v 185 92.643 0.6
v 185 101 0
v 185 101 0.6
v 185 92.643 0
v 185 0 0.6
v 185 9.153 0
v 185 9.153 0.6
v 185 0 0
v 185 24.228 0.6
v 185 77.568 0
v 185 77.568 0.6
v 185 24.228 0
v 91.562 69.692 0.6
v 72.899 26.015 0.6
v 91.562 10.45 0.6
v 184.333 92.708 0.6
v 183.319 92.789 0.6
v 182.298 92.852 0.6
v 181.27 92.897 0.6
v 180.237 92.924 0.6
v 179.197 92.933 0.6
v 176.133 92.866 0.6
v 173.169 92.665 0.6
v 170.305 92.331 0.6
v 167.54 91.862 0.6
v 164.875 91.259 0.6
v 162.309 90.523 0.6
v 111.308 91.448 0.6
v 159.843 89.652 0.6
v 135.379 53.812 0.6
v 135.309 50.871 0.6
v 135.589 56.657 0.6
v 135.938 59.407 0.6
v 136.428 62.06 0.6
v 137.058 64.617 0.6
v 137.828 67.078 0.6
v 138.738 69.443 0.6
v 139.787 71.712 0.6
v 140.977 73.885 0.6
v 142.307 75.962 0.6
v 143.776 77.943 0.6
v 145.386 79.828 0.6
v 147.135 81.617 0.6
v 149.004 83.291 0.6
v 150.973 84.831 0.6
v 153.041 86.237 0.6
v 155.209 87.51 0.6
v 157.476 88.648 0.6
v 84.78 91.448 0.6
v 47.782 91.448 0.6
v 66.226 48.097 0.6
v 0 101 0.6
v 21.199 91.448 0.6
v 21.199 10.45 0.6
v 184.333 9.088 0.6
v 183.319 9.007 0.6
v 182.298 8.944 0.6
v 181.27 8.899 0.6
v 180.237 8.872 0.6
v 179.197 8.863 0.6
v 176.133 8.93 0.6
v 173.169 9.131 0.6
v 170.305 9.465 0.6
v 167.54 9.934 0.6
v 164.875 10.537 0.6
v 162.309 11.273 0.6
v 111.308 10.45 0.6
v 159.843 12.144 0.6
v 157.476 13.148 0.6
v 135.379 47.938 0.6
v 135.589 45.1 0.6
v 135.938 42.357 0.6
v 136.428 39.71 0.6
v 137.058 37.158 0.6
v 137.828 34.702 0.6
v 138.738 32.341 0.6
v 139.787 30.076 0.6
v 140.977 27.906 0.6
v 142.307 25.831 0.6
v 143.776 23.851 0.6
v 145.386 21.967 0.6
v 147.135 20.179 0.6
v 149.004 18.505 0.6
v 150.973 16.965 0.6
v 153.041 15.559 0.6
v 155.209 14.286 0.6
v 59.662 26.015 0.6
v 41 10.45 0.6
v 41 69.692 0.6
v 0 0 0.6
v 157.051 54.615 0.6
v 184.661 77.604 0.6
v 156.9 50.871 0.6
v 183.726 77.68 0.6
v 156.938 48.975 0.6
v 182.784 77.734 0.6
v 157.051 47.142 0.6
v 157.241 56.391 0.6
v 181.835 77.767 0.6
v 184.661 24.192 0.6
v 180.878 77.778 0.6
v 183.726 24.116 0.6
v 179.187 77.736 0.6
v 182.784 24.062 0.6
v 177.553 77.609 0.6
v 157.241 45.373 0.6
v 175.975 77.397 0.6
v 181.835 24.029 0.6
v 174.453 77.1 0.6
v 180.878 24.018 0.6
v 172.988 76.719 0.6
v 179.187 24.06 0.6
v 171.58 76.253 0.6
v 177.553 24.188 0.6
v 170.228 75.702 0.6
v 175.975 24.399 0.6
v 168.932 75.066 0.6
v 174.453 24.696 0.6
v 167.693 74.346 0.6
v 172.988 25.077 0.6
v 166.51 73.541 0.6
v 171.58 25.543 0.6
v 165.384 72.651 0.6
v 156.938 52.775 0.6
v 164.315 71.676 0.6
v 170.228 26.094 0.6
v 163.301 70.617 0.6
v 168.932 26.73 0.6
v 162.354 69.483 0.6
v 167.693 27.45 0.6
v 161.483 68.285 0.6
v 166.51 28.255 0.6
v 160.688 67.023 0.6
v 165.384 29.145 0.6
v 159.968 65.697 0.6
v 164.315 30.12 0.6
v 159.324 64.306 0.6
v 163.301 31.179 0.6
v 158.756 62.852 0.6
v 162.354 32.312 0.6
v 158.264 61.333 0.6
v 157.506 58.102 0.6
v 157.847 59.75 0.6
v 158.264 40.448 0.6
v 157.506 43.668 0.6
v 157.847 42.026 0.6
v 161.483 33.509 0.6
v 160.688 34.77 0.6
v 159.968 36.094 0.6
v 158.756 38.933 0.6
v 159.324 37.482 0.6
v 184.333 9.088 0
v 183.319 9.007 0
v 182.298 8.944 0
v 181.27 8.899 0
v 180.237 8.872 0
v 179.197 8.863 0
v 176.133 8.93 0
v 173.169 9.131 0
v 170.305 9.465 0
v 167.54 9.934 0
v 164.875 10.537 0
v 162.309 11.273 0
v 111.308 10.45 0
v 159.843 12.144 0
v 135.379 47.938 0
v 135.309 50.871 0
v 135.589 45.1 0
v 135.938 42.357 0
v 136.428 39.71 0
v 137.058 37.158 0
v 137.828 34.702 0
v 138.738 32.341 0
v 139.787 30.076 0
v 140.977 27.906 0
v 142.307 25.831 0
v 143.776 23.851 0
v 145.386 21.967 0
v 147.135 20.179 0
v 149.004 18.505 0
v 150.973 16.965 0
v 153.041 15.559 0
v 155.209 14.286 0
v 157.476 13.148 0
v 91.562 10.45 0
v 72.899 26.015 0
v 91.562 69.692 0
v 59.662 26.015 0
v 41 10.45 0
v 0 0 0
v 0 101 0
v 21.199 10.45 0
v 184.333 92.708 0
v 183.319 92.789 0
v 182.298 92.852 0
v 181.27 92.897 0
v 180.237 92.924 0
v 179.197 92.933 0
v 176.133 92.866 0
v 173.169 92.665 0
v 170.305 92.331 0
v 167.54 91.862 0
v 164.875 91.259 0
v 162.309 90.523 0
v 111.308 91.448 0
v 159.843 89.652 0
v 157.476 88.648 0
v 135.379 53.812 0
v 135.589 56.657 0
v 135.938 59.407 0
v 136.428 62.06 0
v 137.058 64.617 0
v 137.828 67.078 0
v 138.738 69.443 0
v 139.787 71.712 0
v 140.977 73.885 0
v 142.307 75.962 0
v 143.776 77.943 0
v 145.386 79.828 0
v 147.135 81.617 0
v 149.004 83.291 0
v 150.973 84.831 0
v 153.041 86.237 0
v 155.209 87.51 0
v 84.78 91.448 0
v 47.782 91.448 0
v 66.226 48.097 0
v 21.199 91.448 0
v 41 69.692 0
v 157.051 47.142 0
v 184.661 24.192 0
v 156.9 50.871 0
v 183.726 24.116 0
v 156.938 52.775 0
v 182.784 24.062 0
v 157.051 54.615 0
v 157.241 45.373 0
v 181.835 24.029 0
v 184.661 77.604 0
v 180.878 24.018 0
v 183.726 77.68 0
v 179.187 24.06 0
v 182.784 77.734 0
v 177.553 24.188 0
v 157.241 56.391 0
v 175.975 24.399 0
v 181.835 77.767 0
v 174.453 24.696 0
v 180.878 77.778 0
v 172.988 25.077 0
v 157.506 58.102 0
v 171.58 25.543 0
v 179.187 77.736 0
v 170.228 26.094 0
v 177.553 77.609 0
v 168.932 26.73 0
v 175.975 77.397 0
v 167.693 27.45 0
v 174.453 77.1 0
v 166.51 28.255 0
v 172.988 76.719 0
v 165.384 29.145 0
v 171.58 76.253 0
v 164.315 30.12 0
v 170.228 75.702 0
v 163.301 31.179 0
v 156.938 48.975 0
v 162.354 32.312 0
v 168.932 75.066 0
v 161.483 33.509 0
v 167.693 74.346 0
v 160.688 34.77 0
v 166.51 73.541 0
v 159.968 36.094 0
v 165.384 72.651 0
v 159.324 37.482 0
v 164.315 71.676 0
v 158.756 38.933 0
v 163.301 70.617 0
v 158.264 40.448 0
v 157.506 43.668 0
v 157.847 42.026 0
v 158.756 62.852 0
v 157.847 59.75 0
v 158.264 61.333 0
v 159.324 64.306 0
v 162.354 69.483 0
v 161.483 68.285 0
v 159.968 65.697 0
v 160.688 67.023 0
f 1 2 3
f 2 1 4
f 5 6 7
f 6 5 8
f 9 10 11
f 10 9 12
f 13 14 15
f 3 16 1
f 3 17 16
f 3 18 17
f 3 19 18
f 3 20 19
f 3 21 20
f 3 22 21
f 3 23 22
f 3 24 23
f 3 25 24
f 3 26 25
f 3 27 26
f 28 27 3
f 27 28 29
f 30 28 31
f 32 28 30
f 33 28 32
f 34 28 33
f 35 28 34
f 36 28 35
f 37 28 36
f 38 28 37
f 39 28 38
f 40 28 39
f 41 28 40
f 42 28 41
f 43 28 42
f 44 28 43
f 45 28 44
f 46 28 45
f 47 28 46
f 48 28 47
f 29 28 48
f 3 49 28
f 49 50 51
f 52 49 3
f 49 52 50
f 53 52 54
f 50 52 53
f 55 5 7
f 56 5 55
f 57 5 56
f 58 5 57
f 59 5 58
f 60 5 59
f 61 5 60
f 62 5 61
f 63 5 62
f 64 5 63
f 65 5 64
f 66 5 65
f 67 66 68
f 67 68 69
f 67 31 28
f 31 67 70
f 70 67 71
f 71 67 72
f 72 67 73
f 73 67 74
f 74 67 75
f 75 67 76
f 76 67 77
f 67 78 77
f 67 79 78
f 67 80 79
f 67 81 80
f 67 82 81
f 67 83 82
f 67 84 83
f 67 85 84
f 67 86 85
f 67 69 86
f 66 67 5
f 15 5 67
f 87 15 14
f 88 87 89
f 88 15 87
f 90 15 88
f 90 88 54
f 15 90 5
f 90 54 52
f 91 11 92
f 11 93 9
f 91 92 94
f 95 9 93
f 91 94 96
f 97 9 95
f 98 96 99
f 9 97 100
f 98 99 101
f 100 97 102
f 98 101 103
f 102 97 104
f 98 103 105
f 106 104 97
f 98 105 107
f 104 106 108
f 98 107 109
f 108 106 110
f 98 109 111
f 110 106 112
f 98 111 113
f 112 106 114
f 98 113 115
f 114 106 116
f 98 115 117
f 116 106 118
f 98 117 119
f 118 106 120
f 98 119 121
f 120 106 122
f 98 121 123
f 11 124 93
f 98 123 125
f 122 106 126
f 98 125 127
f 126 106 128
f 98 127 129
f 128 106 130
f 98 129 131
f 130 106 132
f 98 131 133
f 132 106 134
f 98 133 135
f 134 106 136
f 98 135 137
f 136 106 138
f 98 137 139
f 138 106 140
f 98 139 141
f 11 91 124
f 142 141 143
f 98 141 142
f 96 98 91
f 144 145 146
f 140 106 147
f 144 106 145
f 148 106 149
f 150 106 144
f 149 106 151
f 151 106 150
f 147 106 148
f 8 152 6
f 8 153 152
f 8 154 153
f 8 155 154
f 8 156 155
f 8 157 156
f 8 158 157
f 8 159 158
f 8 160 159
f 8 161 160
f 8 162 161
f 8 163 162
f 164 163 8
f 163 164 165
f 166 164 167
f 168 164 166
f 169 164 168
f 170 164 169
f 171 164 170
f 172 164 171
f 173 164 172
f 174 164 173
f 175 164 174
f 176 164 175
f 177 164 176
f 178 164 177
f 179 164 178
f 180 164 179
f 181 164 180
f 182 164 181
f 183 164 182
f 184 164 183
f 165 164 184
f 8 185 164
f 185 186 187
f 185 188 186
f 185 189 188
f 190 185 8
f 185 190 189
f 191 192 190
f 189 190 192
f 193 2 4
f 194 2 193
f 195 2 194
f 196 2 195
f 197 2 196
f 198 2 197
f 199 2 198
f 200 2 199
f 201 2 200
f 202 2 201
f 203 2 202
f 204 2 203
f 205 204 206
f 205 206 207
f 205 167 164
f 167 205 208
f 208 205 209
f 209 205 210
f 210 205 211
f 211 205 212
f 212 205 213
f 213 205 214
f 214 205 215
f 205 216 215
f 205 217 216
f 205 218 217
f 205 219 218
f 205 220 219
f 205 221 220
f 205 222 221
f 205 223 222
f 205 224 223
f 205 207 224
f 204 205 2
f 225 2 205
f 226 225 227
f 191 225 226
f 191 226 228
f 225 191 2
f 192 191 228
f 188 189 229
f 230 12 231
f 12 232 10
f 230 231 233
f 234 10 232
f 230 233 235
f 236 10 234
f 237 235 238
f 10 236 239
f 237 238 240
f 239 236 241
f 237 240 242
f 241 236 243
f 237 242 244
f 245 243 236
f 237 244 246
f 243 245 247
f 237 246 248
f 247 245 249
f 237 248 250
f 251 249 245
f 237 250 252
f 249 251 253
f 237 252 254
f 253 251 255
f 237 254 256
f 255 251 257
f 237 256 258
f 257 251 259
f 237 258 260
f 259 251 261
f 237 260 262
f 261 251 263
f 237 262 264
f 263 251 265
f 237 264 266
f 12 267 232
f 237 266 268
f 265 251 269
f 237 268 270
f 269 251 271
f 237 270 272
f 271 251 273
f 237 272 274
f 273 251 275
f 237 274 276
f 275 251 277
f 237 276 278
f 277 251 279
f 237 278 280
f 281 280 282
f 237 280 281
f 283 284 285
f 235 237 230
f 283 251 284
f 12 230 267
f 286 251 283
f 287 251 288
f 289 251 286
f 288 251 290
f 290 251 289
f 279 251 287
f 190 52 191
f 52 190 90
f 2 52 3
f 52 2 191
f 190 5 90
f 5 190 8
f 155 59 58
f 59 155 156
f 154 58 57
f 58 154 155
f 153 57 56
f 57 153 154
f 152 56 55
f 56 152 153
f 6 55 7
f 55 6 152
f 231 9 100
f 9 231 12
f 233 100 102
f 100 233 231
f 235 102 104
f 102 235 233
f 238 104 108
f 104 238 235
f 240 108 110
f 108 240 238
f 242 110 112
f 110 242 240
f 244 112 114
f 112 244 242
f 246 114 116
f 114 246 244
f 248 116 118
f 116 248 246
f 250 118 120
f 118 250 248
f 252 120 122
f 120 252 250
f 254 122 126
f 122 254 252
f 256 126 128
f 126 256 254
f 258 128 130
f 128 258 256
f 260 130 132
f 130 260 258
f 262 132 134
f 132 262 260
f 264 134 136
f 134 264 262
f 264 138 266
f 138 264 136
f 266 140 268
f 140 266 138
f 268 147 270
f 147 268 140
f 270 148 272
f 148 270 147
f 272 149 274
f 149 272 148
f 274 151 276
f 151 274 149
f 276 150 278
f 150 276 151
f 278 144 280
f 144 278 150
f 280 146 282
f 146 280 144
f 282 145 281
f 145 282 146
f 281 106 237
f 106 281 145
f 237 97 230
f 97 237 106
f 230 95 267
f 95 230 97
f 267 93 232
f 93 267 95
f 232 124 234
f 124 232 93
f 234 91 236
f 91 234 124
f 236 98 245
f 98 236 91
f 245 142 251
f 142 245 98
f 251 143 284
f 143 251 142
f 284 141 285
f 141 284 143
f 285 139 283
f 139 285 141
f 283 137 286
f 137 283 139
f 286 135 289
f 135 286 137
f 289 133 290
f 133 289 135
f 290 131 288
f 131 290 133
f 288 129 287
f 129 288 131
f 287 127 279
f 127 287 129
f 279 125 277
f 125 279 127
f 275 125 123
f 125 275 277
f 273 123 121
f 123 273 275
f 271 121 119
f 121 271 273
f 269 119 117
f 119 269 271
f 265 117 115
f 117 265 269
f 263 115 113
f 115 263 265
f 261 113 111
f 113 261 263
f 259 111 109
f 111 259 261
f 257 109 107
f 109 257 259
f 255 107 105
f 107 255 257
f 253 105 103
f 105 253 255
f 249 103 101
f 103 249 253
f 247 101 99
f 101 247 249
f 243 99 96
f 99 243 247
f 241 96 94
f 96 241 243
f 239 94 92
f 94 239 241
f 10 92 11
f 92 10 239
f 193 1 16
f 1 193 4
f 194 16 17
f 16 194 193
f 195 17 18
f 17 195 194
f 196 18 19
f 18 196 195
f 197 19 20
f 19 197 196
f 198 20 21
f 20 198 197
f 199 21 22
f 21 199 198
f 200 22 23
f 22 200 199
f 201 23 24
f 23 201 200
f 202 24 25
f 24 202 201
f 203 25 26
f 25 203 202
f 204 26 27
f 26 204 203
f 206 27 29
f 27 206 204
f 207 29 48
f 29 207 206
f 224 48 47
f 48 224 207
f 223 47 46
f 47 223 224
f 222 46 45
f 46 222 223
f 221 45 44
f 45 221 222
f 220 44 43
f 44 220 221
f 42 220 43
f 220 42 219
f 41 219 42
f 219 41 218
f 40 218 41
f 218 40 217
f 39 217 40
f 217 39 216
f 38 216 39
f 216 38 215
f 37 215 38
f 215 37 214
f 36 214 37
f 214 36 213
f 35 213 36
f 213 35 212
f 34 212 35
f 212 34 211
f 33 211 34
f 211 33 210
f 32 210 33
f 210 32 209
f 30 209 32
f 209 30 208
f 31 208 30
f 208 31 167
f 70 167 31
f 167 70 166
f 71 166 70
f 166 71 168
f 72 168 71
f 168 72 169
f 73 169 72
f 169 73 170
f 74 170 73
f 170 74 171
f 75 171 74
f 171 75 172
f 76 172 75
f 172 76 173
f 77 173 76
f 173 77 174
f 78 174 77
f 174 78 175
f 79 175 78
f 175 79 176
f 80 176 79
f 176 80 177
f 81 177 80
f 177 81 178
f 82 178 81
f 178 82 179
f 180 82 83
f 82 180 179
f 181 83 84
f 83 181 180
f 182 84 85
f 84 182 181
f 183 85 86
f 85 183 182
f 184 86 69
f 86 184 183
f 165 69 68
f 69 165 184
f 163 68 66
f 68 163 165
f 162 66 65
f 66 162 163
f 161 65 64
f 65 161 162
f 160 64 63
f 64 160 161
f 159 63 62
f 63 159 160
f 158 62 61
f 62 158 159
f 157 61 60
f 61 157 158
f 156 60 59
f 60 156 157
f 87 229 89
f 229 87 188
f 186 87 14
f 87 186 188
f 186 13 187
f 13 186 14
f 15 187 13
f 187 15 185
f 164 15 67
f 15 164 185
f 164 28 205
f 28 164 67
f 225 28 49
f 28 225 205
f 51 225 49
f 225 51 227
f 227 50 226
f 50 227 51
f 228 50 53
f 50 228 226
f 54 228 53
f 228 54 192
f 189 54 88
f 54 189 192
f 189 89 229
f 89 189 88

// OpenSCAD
// Customizable Stencils v 1.1
// http://www.thingiverse.com/thing:1488794
// Hacked by
// by infinigrove Squirrel Master 2016 (http://www.thingiverse.com/infinigrove)
//
// v1.0 Initial release
// v1.1 Fix issue with customizer and numbers
//      Moved Stencil friendly fonts to the top for customizer

Stencil_Text = "MC";

Stencil_Font="Stardos Stencil"; //[Allerta Stencil,Black Ops One,Sirin Stencil,Stardos Stencil,Wallpoet,Abril Fatface,Aclonica,Acme,Advent Pro,Akronim,Aladin,Alegreya,Alegreya Sans,Alegreya SC,Alex Brush,Alfa Slab One,Alice,Amaranth,Architects Daughter,Archivo Black,Archivo Narrow,Arimo,Arvo,Asap,Astloch,Asul,Averia Libre,Averia Serif Libre,Bangers,Basic,Belgrano,Berkshire Swash,Bigshot One,Bilbo Swash Caps,Bonbon,Bowlby One SC,Brawler,Bubblegum Sans,Butterfly Kids,Cabin Condensed,Caesar Dressing,Cagliostro,Calligraffitti,Capriola,Carter One,Changa One,Chango,Chelsea Market,Cherry Cream Soda,Chewy,Chicle,Chivo,Clicker Script,Coming Soon,Concert One,Condiment,Cookie,Courgette,Covered By Your Grace,Crimson Text,Dancing Script,DejaVu Sans,DejaVu Serif,Dhurjati,Doppio One,Dosis,Droid Sans,Eagle Lake,Electrolize,Emilys Candy,Encode Sans,Encode Sans Compressed,Euphoria Script,Exo,Exo 2,Faster One,Federo,Finger Paint,Fjord One,Fontdiner Swanky,Freckle Face,Fruktur,Gabriela,Geo,Germania One,Give You Glory,Gloria Hallelujah,Goudy Bookletter 1911,Graduate,Grand Hotel,Great Vibes,Griffy,Hanalei Fill,Happy Monkey,Henny Penny,Hind,IM Fell English SC,Indie Flower,Irish Grover,Italianno,Jacques Francois Shadow,Jolly Lodger,Josefin Slab,Joti One,Judson,Just Another Hand,Kalam,Kameron,Karma,Kavoon,Knewave,Kranky,Kristi,Laila,Lakki Reddy,Lancelot,Lato,Leckerli One,Ledger,Lekton,Lemon One,Liberation Sans,Libre Caslon Text,Life Savers,Lilita One,Lily Script One,Limelight,Lobster,Lobster Two,Londrina Outline,Londrina Shadow,Londrina Solid,Lora,Love Ya Like A Sister,Loved by the King,Lovers Quarrel,Luckiest Guy,Lusitana,Macondo,Macondo Swash Caps,Mako,Marck Script,Margarine,Marko One,Maven Pro,McLaren,MedievalSharp,Merienda One,Merriweather,Mervale Script,Metal Mania,Metrophobic,Milonga,Miltonian Tattoo,Miss Fajardose,Molle,Montez,Montserrat,Mr De Haviland,Mystery Quest,Neucha,New Rocker,Niconne,Nosifer,Nothing You Could Do,Noto Sans Oriya,Noto Serif,Nova Square,Nunito,Old Standard TT,Oleo Script,Oleo Script Swash Caps,Orbitron,Oregano,Orienta,Original Surfer,Oswald,Over the Rainbow,Overlock,Oxygen,Pacifico,Paprika,Parisienne,Patrick Hand SC,Paytone One,Peralta,Permanent Marker,Piedra,Pirata One,Play,Playball,Poetsen One,Poppins,Press Start 2P,Princess Sofia,PT Mono,Qwigley,Racing Sans One,Raleway,Rancho,Ranga,Ribeye,Roboto,Roboto Condensed,Roboto Slab,Rochester,Rock Salt,Rubik One,Sail,Salsa,Sansita One,Sarina,Satisfy,Schoolbell,Seaweed Script,Sevillana,Shadows Into Light,Shadows Into Light Two,Share,Six Caps,Skranji,Source Sans Pro,Spicy Rice,Stoke,Syncopate,Teko,Terminal Dosis,The Girl Next Door,Tillana,Timmana,Titillium Web,Ubuntu,Ultra,Underdog,UnifrakturCook,UnifrakturMaguntia,Vampiro One,Vidaloka,Viga,Voces,Volkhov,Vollkorn,Voltaire,Waiting for the Sunrise,Wellfleet,Wendy One,Yellowtail,Yesteryear,Zeyada]

Font_Style="Bold"; //[Regular, Bold, Italic]

//Height of characters [mm]
Font_Size=80;  //[5:200]

Letter_Spacing = 1; //[-1:0.5:5]

Boarder_Top=10;  //[0:90]

Boarder_Bottom=10;  //[0:90]

Boarder_Left=10;  //[0:90]

Boarder_Right=15;  //[-150:150]

Stencil_Depth=.6;  //[.2:0.2:3]

Stencil_Detail=100;  //[5:200]

/* [Hidden] */

letterspacingtext = 1.0+Letter_Spacing/10;

StencilWidth=((Font_Size)*(len(str(Stencil_Text)))+Boarder_Left+Boarder_Right);

StencilHeight=Font_Size+Letter_Spacing+Boarder_Top+Boarder_Bottom;

fontstylestencil = str(Stencil_Font,":",Font_Style);

difference (){
    // create stencil plate
    color("yellow")cube([StencilWidth,StencilHeight,Stencil_Depth]); 
    
    // Remove Characters
    translate([Letter_Spacing+Boarder_Left,Font_Size+Letter_Spacing+Boarder_Bottom,-.5]){
    color("red")linear_extrude(Stencil_Depth+1,$fn=Stencil_Detail) text(str(Stencil_Text), Font_Size, font = fontstylestencil, valign = "top", halign = "left", spacing = letterspacingtext);
}
}
